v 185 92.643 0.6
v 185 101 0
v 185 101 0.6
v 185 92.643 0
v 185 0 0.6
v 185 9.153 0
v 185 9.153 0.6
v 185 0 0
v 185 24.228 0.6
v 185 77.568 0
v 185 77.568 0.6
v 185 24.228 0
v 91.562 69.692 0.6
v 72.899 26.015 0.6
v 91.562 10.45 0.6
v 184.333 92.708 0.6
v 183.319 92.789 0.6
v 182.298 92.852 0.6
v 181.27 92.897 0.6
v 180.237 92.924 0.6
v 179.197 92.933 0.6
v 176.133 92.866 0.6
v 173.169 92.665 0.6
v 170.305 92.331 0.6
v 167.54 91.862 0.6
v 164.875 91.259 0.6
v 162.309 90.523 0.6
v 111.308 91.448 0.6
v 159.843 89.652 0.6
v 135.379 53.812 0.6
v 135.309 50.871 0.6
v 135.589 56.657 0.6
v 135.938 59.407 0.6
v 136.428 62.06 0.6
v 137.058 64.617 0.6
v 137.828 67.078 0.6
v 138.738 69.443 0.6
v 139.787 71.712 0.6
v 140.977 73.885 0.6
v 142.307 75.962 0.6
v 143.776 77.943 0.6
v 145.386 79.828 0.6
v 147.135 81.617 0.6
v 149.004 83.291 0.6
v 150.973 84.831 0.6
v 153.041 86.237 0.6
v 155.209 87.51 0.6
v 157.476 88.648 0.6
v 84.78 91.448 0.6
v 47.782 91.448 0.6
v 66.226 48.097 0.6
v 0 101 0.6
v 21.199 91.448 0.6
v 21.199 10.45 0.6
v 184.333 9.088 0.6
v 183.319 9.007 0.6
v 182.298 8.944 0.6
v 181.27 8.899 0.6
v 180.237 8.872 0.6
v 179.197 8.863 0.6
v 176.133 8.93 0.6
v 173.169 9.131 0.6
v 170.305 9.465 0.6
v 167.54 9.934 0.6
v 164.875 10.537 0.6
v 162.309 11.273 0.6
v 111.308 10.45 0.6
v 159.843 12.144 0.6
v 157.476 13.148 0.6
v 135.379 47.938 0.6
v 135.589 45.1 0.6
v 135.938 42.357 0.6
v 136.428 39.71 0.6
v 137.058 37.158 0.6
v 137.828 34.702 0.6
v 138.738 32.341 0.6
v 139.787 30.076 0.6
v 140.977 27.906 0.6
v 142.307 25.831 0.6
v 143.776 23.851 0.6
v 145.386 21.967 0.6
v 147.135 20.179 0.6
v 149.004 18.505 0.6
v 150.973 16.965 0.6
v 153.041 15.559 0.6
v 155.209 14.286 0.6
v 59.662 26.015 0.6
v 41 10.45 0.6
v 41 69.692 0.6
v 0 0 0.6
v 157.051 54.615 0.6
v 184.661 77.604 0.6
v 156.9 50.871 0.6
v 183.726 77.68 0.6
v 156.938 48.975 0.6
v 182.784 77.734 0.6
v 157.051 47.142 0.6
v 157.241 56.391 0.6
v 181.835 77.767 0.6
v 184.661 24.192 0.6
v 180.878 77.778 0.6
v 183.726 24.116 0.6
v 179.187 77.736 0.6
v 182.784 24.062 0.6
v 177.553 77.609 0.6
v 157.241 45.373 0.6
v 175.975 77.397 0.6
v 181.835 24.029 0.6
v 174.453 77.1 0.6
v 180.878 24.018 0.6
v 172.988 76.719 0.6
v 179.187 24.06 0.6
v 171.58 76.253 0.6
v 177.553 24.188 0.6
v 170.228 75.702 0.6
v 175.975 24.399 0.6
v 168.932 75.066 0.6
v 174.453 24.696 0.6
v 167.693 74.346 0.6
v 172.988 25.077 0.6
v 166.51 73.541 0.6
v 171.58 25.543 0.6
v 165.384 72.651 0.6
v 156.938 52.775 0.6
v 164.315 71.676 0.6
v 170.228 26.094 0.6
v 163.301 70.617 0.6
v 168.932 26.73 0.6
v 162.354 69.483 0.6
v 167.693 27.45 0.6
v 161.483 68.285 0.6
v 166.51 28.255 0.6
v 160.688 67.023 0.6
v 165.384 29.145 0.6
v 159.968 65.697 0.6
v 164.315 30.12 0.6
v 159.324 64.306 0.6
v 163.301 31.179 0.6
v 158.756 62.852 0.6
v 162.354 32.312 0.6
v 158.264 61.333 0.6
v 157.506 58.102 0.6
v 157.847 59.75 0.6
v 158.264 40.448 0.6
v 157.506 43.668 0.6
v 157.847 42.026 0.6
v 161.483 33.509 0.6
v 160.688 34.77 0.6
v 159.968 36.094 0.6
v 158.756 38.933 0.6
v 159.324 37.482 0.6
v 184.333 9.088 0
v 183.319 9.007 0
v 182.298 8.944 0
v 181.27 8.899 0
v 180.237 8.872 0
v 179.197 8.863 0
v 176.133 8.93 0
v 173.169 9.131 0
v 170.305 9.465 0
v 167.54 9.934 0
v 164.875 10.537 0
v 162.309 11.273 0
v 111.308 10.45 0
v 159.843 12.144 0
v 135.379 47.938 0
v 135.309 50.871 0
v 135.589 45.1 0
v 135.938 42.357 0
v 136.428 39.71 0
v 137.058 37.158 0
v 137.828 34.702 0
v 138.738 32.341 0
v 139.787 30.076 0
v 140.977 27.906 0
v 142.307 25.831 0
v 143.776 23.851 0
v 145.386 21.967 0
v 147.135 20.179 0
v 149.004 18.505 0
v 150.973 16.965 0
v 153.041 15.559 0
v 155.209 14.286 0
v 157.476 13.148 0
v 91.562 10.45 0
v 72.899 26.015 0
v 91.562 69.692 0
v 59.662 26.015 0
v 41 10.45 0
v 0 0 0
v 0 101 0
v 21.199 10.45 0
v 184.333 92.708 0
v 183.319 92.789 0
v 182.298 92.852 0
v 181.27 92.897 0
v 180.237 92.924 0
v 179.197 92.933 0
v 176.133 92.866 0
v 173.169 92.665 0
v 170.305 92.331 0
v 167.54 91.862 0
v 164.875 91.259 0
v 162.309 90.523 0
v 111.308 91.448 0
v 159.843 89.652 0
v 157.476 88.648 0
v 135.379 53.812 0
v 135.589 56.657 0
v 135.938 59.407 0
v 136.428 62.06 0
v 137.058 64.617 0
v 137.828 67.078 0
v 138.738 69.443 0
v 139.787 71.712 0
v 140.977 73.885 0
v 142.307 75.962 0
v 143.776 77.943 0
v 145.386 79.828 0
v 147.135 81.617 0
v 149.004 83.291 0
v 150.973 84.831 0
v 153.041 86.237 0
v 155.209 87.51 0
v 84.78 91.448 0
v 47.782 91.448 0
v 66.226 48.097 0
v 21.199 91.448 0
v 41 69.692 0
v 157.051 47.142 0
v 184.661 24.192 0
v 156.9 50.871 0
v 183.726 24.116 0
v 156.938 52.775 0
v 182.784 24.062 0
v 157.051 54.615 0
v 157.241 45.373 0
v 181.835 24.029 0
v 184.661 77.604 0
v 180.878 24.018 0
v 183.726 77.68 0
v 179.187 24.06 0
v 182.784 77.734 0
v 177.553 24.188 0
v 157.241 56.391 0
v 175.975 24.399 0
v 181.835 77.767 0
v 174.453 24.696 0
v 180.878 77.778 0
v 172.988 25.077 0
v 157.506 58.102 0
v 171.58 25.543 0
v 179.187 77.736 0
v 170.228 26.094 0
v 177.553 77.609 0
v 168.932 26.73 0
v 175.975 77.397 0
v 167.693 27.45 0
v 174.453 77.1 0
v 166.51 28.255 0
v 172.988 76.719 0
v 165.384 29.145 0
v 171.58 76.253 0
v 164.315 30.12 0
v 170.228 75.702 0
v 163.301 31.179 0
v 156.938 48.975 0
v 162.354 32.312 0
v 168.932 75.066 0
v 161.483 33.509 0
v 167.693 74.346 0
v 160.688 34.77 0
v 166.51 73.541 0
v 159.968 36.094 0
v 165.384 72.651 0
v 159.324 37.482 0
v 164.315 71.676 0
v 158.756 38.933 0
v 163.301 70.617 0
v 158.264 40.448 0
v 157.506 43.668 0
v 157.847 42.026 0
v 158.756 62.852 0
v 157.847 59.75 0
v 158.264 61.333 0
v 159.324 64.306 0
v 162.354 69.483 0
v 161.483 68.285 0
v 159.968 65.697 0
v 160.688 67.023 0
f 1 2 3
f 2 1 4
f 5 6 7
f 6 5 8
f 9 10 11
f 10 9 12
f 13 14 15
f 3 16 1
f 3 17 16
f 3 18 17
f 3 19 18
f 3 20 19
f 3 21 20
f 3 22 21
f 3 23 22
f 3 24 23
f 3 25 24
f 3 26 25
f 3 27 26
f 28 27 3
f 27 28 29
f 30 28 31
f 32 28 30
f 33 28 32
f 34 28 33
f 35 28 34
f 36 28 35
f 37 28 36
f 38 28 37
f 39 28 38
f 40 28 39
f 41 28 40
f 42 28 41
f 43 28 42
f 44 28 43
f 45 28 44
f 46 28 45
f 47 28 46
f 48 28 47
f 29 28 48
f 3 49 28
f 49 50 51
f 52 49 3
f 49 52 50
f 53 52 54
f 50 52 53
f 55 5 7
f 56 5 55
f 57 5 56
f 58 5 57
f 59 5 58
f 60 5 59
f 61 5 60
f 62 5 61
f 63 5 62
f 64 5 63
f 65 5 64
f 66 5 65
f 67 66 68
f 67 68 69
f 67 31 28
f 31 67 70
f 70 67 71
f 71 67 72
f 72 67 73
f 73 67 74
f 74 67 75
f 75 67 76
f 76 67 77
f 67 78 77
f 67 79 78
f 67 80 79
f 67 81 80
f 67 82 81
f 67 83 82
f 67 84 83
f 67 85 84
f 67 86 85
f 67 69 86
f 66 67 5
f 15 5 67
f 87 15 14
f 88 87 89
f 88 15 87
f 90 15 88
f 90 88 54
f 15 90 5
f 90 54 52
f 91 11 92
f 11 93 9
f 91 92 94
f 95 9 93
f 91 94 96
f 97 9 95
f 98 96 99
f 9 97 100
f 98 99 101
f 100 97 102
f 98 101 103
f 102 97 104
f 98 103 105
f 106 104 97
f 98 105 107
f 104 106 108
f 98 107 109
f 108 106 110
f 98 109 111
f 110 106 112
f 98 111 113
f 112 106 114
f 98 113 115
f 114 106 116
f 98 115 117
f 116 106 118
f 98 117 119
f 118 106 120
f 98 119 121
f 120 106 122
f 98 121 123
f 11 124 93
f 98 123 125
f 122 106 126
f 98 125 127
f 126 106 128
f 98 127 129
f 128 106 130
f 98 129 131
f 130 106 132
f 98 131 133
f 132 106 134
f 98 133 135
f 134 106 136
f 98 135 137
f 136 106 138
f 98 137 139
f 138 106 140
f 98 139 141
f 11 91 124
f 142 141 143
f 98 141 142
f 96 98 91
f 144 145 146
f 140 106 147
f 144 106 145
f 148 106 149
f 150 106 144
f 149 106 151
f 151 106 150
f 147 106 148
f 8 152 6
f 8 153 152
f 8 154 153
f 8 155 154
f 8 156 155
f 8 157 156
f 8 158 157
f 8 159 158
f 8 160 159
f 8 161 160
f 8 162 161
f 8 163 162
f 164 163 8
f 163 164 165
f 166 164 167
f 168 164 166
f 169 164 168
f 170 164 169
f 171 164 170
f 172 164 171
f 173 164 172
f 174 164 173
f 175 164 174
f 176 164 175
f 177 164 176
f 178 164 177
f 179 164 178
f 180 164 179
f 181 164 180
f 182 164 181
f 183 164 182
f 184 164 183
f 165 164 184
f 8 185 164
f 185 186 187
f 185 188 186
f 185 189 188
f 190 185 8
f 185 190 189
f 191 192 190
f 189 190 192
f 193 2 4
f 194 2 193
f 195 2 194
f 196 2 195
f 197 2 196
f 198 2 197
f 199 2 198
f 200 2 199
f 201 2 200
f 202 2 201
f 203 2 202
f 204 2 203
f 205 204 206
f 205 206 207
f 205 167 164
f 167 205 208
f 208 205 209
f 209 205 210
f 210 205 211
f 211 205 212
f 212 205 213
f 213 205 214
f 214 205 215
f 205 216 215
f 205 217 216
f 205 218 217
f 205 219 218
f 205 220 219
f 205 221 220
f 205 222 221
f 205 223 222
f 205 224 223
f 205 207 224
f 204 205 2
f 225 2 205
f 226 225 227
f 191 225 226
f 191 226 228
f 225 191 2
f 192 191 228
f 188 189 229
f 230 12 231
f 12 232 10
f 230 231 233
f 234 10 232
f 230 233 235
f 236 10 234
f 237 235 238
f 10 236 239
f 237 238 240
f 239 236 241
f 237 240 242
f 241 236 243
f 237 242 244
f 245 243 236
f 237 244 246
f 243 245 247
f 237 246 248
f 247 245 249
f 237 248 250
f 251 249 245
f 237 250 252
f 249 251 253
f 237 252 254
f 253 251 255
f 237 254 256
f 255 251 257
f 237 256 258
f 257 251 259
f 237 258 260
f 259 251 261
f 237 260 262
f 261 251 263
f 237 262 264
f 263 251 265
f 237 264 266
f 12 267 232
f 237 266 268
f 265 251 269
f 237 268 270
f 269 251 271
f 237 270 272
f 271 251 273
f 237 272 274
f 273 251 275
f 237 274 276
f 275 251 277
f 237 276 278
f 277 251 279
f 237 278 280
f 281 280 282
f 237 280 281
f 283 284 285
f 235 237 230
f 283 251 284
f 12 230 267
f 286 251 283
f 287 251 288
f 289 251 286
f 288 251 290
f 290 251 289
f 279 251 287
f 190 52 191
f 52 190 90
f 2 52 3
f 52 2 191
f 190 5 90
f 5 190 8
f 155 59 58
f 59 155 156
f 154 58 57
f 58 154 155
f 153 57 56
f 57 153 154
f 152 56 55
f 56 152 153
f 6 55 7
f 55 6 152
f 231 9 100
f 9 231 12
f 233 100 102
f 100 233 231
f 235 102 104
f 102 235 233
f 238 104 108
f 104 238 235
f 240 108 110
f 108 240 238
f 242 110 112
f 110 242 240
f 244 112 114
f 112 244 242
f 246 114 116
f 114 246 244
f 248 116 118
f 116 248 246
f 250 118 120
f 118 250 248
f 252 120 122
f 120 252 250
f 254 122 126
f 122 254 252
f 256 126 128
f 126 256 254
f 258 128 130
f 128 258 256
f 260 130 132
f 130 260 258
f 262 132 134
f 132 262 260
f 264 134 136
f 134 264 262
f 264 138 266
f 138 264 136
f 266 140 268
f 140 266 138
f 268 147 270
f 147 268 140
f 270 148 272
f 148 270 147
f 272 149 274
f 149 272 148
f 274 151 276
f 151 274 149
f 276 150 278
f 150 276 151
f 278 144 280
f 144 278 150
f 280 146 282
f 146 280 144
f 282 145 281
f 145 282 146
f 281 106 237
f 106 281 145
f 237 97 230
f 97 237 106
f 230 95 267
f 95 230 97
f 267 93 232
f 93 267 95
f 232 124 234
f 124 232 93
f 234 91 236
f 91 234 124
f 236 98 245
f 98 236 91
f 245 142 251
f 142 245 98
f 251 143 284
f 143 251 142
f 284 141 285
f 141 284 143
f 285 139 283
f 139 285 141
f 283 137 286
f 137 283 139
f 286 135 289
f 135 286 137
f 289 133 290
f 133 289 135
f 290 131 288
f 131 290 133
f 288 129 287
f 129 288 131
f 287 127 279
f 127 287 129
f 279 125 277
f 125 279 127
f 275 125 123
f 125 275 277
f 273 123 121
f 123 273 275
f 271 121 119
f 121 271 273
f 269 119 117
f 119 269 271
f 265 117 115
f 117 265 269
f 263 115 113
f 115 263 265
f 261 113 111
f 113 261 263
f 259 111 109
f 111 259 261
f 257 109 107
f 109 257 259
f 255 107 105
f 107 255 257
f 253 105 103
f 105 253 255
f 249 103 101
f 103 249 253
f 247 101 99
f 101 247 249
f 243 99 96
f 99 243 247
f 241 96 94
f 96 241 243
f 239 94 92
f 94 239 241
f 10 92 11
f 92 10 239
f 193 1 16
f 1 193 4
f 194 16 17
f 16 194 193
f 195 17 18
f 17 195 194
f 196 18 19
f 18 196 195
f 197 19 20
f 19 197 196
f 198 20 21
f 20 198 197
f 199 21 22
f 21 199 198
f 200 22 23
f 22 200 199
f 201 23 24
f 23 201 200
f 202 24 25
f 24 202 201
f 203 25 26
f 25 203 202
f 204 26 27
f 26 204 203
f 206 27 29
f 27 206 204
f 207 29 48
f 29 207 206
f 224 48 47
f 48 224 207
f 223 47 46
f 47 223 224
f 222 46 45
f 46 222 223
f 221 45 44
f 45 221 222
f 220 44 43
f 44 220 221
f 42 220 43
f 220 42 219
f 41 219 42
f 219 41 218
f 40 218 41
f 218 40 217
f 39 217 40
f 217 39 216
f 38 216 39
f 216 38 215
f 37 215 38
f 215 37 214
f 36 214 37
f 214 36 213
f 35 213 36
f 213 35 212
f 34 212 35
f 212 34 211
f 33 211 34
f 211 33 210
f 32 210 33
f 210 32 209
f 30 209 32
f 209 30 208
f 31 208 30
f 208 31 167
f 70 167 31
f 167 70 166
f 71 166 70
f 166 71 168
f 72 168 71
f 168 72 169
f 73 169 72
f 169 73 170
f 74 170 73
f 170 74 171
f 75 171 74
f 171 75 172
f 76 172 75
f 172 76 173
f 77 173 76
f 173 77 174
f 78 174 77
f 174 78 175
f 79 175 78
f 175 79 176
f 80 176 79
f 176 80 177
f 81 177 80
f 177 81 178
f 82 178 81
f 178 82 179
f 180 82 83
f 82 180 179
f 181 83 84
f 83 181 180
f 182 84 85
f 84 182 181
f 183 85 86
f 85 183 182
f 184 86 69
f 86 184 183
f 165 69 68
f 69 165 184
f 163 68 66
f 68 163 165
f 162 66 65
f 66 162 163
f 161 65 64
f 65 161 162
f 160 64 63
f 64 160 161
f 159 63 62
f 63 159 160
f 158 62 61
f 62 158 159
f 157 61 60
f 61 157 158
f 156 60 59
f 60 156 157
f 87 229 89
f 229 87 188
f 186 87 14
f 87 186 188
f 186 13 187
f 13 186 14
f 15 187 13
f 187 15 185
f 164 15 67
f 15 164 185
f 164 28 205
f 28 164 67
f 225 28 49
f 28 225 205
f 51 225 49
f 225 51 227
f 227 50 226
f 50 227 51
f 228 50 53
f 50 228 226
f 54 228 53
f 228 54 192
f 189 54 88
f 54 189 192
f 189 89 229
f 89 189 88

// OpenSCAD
// Customizable Stencils v 1.1
// http://www.thingiverse.com/thing:1488794
// Hacked by
// by infinigrove Squirrel Master 2016 (http://www.thingiverse.com/infinigrove)
//
// v1.0 Initial release
// v1.1 Fix issue with customizer and numbers
//      Moved Stencil friendly fonts to the top for customizer

Stencil_Text = "MC";

Stencil_Font="Stardos Stencil"; //[Allerta Stencil,Black Ops One,Sirin Stencil,Stardos Stencil,Wallpoet,Abril Fatface,Aclonica,Acme,Advent Pro,Akronim,Aladin,Alegreya,Alegreya Sans,Alegreya SC,Alex Brush,Alfa Slab One,Alice,Amaranth,Architects Daughter,Archivo Black,Archivo Narrow,Arimo,Arvo,Asap,Astloch,Asul,Averia Libre,Averia Serif Libre,Bangers,Basic,Belgrano,Berkshire Swash,Bigshot One,Bilbo Swash Caps,Bonbon,Bowlby One SC,Brawler,Bubblegum Sans,Butterfly Kids,Cabin Condensed,Caesar Dressing,Cagliostro,Calligraffitti,Capriola,Carter One,Changa One,Chango,Chelsea Market,Cherry Cream Soda,Chewy,Chicle,Chivo,Clicker Script,Coming Soon,Concert One,Condiment,Cookie,Courgette,Covered By Your Grace,Crimson Text,Dancing Script,DejaVu Sans,DejaVu Serif,Dhurjati,Doppio One,Dosis,Droid Sans,Eagle Lake,Electrolize,Emilys Candy,Encode Sans,Encode Sans Compressed,Euphoria Script,Exo,Exo 2,Faster One,Federo,Finger Paint,Fjord One,Fontdiner Swanky,Freckle Face,Fruktur,Gabriela,Geo,Germania One,Give You Glory,Gloria Hallelujah,Goudy Bookletter 1911,Graduate,Grand Hotel,Great Vibes,Griffy,Hanalei Fill,Happy Monkey,Henny Penny,Hind,IM Fell English SC,Indie Flower,Irish Grover,Italianno,Jacques Francois Shadow,Jolly Lodger,Josefin Slab,Joti One,Judson,Just Another Hand,Kalam,Kameron,Karma,Kavoon,Knewave,Kranky,Kristi,Laila,Lakki Reddy,Lancelot,Lato,Leckerli One,Ledger,Lekton,Lemon One,Liberation Sans,Libre Caslon Text,Life Savers,Lilita One,Lily Script One,Limelight,Lobster,Lobster Two,Londrina Outline,Londrina Shadow,Londrina Solid,Lora,Love Ya Like A Sister,Loved by the King,Lovers Quarrel,Luckiest Guy,Lusitana,Macondo,Macondo Swash Caps,Mako,Marck Script,Margarine,Marko One,Maven Pro,McLaren,MedievalSharp,Merienda One,Merriweather,Mervale Script,Metal Mania,Metrophobic,Milonga,Miltonian Tattoo,Miss Fajardose,Molle,Montez,Montserrat,Mr De Haviland,Mystery Quest,Neucha,New Rocker,Niconne,Nosifer,Nothing You Could Do,Noto Sans Oriya,Noto Serif,Nova Square,Nunito,Old Standard TT,Oleo Script,Oleo Script Swash Caps,Orbitron,Oregano,Orienta,Original Surfer,Oswald,Over the Rainbow,Overlock,Oxygen,Pacifico,Paprika,Parisienne,Patrick Hand SC,Paytone One,Peralta,Permanent Marker,Piedra,Pirata One,Play,Playball,Poetsen One,Poppins,Press Start 2P,Princess Sofia,PT Mono,Qwigley,Racing Sans One,Raleway,Rancho,Ranga,Ribeye,Roboto,Roboto Condensed,Roboto Slab,Rochester,Rock Salt,Rubik One,Sail,Salsa,Sansita One,Sarina,Satisfy,Schoolbell,Seaweed Script,Sevillana,Shadows Into Light,Shadows Into Light Two,Share,Six Caps,Skranji,Source Sans Pro,Spicy Rice,Stoke,Syncopate,Teko,Terminal Dosis,The Girl Next Door,Tillana,Timmana,Titillium Web,Ubuntu,Ultra,Underdog,UnifrakturCook,UnifrakturMaguntia,Vampiro One,Vidaloka,Viga,Voces,Volkhov,Vollkorn,Voltaire,Waiting for the Sunrise,Wellfleet,Wendy One,Yellowtail,Yesteryear,Zeyada]

Font_Style="Bold"; //[Regular, Bold, Italic]

//Height of characters [mm]
Font_Size=80;  //[5:200]

Letter_Spacing = 1; //[-1:0.5:5]

Boarder_Top=10;  //[0:90]

Boarder_Bottom=10;  //[0:90]

Boarder_Left=10;  //[0:90]

Boarder_Right=15;  //[-150:150]

Stencil_Depth=.6;  //[.2:0.2:3]

Stencil_Detail=100;  //[5:200]

/* [Hidden] */

letterspacingtext = 1.0+Letter_Spacing/10;

StencilWidth=((Font_Size)*(len(str(Stencil_Text)))+Boarder_Left+Boarder_Right);

StencilHeight=Font_Size+Letter_Spacing+Boarder_Top+Boarder_Bottom;

fontstylestencil = str(Stencil_Font,":",Font_Style);

difference (){
    // create stencil plate
    color("yellow")cube([StencilWidth,StencilHeight,Stencil_Depth]); 
    
    // Remove Characters
    translate([Letter_Spacing+Boarder_Left,Font_Size+Letter_Spacing+Boarder_Bottom,-.5]){
    color("red")linear_extrude(Stencil_Depth+1,$fn=Stencil_Detail) text(str(Stencil_Text), Font_Size, font = fontstylestencil, valign = "top", halign = "left", spacing = letterspacingtext);
}
}
